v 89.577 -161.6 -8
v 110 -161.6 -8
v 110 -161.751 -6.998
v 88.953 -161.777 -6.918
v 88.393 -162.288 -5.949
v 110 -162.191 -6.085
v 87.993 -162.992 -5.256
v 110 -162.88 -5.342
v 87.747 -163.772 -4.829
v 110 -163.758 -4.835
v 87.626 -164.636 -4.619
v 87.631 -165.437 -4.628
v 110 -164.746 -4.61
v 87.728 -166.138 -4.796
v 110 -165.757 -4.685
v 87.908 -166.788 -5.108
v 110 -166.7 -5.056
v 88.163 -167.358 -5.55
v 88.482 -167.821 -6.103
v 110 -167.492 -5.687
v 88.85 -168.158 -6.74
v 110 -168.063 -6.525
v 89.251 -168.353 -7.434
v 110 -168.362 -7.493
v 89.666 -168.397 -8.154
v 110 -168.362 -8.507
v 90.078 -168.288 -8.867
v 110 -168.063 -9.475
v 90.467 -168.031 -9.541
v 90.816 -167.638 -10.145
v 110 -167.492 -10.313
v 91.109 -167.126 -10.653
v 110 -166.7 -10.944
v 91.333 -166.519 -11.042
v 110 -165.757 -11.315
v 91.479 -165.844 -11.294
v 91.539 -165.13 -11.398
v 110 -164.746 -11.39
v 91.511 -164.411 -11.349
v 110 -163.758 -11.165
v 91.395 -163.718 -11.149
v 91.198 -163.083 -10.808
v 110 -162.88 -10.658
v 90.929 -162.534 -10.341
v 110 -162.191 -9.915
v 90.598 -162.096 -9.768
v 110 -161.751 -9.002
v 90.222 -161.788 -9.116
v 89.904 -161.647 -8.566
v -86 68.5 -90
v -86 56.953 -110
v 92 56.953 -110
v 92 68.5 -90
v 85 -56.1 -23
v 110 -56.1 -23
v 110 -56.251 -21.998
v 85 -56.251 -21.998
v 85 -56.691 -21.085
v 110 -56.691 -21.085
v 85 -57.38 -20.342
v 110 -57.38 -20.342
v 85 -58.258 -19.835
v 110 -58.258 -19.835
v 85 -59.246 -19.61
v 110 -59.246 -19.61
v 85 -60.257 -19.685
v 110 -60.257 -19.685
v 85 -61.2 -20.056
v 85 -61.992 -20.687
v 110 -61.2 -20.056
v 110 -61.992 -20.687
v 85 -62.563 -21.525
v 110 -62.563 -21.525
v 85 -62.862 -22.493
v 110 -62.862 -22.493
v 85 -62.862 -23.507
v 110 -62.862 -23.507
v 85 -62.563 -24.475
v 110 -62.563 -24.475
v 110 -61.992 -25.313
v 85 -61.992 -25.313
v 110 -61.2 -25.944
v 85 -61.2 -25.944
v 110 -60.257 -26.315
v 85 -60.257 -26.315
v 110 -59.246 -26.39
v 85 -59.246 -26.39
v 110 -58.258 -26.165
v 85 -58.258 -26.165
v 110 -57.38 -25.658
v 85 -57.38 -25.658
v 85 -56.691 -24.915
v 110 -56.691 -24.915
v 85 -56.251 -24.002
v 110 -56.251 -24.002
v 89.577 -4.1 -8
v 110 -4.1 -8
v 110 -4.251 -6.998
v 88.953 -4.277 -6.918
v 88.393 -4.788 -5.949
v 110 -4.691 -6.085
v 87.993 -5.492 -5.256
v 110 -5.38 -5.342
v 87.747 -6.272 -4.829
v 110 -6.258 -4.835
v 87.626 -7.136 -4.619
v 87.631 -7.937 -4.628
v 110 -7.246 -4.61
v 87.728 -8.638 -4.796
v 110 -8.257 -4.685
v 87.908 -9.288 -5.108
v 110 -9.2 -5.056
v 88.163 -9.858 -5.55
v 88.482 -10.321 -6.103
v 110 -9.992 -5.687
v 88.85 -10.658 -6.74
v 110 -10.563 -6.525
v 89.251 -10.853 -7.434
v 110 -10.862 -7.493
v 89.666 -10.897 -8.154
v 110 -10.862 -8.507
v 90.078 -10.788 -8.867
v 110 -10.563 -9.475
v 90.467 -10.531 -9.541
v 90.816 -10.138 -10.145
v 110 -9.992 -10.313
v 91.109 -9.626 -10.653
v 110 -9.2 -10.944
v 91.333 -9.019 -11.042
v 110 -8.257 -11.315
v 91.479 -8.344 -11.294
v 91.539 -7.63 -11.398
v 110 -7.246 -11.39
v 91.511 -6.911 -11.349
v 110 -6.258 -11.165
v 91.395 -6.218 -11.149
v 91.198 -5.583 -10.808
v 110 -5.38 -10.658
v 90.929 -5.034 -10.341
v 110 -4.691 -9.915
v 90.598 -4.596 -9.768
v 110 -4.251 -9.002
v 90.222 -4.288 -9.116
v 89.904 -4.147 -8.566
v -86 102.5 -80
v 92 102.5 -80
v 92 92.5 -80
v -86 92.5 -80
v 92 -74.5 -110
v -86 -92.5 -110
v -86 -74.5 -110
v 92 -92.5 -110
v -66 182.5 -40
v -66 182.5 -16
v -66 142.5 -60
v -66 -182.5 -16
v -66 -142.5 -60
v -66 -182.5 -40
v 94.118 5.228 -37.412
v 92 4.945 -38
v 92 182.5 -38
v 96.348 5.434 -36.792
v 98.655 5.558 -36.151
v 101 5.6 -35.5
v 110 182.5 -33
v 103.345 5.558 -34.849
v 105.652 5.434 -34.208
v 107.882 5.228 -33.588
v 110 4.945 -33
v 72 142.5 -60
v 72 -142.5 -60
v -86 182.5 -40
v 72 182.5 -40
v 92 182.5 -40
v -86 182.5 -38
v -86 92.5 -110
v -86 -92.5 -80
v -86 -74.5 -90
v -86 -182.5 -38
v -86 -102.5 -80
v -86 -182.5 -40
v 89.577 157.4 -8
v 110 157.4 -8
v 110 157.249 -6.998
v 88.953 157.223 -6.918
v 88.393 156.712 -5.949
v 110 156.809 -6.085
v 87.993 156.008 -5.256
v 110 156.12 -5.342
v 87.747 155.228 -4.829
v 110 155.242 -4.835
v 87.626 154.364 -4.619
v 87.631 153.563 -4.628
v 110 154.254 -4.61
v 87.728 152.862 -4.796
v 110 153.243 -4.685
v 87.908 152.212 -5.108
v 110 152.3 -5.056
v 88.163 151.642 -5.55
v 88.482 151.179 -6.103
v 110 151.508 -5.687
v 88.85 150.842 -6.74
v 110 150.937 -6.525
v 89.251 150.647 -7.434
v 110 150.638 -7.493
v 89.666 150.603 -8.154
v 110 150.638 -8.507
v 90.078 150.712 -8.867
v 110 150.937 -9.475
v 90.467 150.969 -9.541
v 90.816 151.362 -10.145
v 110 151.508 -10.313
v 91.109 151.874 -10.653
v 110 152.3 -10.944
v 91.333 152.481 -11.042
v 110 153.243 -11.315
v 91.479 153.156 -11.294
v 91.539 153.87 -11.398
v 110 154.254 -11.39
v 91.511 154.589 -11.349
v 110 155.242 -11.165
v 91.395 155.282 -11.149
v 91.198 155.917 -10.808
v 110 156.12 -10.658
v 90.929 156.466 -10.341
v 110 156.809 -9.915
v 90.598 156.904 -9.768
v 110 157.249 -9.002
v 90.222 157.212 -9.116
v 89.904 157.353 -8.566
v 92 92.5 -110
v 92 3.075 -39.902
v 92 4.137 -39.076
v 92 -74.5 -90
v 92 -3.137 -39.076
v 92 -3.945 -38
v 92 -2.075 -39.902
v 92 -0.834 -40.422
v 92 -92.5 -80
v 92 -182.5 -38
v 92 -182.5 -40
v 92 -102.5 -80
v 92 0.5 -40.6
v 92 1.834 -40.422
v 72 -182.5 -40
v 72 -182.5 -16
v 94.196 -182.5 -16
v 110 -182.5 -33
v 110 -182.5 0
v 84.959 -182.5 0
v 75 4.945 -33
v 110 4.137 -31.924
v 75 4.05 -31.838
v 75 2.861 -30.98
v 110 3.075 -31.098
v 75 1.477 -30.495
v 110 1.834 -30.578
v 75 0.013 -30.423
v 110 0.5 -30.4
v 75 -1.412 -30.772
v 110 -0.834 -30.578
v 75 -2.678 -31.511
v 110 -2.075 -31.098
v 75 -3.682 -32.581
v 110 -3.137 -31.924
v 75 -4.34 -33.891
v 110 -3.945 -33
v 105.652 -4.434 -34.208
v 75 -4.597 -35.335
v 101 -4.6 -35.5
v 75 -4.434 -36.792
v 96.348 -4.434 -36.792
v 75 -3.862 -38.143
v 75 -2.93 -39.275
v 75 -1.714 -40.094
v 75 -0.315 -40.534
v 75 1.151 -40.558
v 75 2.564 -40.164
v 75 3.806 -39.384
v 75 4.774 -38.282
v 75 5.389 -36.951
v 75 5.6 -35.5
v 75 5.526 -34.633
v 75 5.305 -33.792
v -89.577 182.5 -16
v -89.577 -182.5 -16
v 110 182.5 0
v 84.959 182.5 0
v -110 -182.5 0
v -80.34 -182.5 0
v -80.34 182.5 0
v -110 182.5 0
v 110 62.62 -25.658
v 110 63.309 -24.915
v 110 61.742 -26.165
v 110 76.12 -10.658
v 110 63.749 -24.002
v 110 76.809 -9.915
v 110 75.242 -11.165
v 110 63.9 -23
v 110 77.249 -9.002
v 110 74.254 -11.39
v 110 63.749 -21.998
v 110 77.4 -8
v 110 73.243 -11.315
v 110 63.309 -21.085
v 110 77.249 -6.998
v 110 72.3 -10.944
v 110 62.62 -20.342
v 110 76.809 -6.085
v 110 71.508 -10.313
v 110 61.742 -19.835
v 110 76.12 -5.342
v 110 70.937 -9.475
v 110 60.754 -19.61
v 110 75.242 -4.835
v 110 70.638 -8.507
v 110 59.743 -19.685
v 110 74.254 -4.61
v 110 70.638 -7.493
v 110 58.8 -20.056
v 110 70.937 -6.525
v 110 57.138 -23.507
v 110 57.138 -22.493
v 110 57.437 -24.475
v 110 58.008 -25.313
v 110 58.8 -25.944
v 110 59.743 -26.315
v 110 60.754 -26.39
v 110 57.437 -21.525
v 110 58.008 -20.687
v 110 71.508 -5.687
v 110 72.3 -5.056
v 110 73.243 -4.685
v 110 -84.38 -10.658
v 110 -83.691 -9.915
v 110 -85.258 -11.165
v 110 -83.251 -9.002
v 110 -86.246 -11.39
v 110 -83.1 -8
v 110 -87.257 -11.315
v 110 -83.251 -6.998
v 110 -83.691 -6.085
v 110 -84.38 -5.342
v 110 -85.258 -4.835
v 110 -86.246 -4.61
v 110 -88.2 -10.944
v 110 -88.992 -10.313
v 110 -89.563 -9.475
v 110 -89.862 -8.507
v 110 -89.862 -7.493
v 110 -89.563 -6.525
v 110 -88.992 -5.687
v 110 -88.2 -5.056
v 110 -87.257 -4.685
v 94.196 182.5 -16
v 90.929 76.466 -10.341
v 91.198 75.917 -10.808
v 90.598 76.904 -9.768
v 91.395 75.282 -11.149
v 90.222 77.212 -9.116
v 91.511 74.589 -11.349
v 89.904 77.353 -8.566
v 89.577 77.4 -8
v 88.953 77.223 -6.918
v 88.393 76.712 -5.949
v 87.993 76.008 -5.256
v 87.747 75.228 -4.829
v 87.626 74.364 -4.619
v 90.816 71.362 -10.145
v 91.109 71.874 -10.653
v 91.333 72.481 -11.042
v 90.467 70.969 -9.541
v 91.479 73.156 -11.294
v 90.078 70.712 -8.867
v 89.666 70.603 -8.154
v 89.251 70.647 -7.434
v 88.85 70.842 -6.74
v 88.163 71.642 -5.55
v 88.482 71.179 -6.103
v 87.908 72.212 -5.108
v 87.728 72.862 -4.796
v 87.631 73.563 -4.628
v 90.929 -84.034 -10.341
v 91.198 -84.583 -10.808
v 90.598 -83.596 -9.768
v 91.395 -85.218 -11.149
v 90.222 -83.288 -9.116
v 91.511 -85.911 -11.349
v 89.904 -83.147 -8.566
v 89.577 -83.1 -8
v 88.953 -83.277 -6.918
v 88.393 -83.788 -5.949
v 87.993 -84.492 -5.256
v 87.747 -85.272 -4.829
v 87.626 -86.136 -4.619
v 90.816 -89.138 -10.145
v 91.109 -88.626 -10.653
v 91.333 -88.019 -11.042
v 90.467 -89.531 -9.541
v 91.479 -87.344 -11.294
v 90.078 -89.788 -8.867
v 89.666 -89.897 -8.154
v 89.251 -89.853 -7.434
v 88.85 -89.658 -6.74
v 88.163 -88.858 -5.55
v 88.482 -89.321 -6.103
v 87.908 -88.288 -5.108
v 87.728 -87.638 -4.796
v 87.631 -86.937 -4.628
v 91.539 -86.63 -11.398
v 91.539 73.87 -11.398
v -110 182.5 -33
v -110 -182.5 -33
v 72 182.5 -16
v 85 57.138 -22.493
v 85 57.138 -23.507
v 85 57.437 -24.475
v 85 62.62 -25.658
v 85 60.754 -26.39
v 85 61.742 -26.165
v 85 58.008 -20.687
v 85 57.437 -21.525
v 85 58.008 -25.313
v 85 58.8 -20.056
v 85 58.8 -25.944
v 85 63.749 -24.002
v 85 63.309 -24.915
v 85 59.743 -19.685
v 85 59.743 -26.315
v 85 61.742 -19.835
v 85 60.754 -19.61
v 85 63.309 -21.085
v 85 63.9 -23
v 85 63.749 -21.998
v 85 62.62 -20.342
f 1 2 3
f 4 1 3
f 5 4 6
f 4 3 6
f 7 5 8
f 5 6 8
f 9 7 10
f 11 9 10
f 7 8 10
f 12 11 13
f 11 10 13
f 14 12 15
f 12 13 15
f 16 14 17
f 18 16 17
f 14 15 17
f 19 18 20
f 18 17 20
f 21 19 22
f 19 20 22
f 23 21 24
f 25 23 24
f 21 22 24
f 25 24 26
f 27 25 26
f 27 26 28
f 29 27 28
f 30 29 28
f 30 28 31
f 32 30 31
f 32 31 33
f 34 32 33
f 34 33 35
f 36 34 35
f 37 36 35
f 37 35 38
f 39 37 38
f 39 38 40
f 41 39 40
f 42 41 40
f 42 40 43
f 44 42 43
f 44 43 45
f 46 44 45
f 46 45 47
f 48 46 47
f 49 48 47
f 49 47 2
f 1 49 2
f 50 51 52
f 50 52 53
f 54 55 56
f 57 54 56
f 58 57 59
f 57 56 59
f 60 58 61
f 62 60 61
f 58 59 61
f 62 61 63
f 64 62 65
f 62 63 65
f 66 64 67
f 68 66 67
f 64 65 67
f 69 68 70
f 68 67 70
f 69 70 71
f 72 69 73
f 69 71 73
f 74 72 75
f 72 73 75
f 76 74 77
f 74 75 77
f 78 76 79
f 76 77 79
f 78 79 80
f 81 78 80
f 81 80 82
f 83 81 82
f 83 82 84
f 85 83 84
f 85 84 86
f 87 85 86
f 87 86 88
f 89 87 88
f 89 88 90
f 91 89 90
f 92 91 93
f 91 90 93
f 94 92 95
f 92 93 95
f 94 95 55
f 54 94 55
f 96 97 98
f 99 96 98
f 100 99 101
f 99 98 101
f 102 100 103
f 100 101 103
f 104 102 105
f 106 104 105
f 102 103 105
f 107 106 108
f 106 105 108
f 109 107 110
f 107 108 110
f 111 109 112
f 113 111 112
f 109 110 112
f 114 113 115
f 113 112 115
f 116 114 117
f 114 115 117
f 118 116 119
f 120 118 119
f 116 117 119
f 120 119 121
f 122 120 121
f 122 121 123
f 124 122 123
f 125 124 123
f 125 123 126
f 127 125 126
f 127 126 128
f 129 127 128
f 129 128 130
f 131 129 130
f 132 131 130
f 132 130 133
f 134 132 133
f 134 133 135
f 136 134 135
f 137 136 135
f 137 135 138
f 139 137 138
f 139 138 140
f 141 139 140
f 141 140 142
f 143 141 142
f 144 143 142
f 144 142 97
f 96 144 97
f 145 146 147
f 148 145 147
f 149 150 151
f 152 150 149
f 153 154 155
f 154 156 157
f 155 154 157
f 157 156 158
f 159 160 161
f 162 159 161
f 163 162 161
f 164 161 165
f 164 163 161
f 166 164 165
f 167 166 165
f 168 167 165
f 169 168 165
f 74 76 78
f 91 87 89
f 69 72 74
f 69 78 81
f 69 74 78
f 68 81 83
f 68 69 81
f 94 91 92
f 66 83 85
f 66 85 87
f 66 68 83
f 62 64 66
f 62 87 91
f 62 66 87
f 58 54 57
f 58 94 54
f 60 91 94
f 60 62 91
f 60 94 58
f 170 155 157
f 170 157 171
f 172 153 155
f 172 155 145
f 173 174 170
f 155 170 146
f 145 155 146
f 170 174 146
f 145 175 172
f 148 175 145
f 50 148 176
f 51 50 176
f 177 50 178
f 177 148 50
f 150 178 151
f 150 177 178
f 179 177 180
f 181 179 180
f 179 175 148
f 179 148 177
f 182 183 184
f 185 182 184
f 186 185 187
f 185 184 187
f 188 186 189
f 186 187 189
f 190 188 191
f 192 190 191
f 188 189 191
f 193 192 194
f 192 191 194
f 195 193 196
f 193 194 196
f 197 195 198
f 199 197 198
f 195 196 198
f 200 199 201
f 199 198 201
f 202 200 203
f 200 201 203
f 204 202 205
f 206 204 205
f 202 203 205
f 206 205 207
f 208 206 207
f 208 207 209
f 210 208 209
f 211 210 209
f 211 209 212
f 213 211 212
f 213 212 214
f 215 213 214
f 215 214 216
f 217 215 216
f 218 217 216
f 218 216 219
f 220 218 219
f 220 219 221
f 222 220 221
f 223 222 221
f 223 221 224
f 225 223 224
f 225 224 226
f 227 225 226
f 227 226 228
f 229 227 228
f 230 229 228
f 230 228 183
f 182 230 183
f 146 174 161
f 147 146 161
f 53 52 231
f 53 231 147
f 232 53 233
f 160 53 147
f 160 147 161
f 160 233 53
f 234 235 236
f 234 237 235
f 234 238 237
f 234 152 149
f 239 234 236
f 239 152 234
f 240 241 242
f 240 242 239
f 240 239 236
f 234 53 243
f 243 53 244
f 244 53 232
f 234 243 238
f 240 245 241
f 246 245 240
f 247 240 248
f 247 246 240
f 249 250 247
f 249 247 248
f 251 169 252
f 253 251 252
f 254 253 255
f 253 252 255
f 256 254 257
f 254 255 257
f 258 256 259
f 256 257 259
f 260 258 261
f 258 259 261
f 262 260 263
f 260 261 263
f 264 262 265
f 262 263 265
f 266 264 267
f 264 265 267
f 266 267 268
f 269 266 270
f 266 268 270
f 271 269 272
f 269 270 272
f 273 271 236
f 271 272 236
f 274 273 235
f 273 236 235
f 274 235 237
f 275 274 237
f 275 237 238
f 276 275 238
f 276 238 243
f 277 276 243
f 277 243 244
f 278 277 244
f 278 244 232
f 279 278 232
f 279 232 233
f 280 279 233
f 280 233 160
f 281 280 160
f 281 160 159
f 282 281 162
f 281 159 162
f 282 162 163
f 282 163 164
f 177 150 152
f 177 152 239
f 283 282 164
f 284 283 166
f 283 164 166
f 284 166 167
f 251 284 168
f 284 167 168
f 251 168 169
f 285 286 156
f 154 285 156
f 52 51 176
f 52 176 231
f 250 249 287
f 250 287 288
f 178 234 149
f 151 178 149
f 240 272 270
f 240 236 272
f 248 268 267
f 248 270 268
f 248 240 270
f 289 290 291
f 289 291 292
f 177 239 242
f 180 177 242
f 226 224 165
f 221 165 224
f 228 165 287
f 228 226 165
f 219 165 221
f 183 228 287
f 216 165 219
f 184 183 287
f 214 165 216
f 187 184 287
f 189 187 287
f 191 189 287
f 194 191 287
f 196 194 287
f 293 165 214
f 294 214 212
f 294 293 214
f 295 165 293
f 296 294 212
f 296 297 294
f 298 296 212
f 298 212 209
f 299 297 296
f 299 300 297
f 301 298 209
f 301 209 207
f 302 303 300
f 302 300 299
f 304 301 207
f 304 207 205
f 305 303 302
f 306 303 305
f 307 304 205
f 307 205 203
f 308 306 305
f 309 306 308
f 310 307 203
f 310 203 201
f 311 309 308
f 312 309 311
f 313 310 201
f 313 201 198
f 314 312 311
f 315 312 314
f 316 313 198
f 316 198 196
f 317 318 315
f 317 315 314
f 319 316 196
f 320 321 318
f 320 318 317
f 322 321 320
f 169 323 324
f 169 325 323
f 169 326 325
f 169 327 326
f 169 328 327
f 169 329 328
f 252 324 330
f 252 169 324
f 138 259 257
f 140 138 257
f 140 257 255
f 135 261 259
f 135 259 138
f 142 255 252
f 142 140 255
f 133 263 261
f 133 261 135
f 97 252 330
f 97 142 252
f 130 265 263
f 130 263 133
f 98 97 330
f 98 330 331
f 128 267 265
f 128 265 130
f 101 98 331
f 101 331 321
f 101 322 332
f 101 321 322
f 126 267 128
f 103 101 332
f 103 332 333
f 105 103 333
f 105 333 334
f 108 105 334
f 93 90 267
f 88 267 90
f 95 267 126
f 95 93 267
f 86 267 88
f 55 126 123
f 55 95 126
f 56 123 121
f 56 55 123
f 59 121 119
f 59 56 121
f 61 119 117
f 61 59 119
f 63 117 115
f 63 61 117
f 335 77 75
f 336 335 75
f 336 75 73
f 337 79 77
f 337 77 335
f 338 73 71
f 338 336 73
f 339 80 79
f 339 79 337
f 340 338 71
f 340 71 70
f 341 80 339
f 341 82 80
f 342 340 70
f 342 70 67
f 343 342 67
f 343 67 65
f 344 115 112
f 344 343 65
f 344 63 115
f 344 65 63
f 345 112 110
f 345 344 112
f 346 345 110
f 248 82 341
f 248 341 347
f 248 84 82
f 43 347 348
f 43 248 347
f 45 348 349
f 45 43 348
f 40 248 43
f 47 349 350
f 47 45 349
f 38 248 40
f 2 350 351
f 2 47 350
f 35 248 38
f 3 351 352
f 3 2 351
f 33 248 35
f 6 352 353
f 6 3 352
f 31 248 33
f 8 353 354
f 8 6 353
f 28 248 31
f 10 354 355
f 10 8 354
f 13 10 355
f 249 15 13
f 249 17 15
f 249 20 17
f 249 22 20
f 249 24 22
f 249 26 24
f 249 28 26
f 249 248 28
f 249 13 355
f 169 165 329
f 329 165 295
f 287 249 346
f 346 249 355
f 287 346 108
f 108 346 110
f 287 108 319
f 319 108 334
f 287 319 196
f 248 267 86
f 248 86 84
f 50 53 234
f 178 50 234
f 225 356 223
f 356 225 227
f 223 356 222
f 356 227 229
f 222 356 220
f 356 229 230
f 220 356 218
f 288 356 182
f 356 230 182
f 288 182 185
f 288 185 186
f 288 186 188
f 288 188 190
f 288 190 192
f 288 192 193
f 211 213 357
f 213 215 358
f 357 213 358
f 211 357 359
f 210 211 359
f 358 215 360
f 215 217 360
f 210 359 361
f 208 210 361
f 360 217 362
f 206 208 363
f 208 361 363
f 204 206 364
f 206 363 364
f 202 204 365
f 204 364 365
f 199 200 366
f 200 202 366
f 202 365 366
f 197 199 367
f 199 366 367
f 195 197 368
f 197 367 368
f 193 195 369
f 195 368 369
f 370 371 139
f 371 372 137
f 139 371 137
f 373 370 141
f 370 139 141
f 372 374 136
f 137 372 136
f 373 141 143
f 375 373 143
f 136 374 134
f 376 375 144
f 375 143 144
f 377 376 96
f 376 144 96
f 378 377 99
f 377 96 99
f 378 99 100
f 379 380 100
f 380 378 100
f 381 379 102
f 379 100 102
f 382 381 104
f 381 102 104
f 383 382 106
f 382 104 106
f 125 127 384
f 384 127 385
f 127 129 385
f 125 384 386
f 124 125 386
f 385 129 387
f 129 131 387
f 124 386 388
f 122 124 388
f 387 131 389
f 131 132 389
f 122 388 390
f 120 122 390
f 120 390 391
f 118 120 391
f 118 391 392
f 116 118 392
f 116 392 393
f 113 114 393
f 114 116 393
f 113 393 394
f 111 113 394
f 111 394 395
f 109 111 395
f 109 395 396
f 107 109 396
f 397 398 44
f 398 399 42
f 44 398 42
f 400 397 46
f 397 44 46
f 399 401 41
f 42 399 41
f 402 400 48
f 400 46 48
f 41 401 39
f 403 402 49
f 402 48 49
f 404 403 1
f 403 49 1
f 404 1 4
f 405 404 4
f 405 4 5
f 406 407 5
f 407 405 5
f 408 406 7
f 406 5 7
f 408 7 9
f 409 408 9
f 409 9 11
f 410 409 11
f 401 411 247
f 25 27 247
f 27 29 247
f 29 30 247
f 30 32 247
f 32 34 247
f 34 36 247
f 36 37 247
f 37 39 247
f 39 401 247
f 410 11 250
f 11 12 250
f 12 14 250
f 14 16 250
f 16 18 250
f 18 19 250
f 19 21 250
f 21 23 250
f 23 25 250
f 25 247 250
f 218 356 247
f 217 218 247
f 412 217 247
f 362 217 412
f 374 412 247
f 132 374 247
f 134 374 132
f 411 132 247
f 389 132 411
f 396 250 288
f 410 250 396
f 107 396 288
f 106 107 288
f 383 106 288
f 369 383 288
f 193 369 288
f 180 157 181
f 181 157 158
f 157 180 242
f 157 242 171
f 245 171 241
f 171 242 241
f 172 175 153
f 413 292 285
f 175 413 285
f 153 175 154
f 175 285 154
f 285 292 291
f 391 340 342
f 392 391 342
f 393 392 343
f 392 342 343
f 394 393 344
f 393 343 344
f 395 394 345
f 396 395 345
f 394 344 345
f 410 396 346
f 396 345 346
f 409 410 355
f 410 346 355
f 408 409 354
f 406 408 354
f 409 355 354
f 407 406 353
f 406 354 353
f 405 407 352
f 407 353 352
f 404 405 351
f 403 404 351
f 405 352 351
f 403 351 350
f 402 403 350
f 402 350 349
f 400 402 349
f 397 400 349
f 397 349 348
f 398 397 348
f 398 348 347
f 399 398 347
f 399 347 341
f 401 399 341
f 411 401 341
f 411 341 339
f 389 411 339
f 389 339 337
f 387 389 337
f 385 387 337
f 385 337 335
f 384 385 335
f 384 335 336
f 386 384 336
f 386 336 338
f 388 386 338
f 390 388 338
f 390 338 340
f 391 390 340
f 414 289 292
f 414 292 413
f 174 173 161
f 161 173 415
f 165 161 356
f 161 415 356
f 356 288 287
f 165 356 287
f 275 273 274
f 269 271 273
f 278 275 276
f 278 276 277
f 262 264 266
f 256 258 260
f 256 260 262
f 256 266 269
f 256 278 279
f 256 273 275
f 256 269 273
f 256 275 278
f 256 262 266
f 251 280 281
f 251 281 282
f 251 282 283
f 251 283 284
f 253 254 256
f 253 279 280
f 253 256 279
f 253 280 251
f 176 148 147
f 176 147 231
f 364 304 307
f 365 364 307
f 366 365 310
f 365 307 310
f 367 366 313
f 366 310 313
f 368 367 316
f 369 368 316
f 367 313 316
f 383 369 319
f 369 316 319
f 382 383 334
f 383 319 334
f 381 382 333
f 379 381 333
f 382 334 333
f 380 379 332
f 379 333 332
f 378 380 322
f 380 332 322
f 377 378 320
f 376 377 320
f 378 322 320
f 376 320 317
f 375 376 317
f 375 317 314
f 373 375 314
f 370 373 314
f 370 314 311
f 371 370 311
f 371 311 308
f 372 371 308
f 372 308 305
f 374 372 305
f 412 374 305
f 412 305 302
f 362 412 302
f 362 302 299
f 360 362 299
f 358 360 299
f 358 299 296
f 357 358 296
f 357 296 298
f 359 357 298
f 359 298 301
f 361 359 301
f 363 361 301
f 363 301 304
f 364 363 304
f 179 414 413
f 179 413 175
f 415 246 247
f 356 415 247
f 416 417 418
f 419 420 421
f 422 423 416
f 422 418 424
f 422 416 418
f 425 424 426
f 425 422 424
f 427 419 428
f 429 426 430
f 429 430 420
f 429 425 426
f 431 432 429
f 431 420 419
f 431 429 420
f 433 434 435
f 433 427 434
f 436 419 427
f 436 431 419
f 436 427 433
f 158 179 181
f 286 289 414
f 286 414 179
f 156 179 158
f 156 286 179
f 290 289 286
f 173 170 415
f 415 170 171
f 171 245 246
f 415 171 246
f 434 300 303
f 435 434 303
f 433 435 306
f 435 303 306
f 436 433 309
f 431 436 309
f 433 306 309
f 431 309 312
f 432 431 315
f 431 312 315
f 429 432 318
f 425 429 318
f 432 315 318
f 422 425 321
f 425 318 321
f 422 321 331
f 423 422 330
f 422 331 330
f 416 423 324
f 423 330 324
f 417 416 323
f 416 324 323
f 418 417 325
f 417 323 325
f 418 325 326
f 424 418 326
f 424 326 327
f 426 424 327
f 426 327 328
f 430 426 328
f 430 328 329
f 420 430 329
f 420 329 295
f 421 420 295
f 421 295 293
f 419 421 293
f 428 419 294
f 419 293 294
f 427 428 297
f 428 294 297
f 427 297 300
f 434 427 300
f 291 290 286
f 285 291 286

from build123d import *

# Parameters (mm, degrees)
F1_DEPTH  = 182.5
F3_DEPTH  = 200
F5_DEPTH  = 200
F7_DEPTH  = 220.001
F8_W      = 138
F8_H      = 20
F8_H_2    = 24
F9_DEPTH  = 365.001
F12_DEPTH = 35
F10_R     = 3.4
F14_DEPTH = 22.3866406461
F13_R     = 3.4
F15_DEPTH = 25
F16_DEPTH = 25


with BuildPart() as f1:
    # F0 (on Front) → F1 (new body, symmetric)
    with BuildSketch(Plane.XZ):
        Polygon((110, 0), (-110, 0), (-110, -33), (-86, -38), (-86, -110), (92, -110), (92, -38), (110, -33), align=None)
    extrude(amount=F1_DEPTH, both=True)

    # F2 (on Front) → F3 (cut, symmetric)
    with BuildSketch(Plane.XZ):
        Polygon((84.9585481157, 0), (-80.3397459622, 0), (-89.5773502692, -16), (94.1961524227, -16), align=None)
    extrude(amount=F3_DEPTH, both=True, mode=Mode.SUBTRACT)

    # F4 (on Right) → F5 (cut, symmetric)
    with BuildSketch(Plane.YZ):
        Polygon((-74.5, -90), (-74.5, -110), (56.9529946162, -110), (68.5, -90), align=None)
    extrude(amount=F5_DEPTH, both=True, mode=Mode.SUBTRACT)

    # F6 (on face) → F7 (cut, through all)
    with BuildSketch(Plane.YZ.offset(110)):
        Polygon((-102.5, -80), (-182.5, -40), (-182.5, -150), (-92.5, -150), (-92.5, -80), align=None)
        Polygon((182.5, -150), (182.5, -40), (102.5, -80), (92.5, -80), (92.5, -150), align=None)
    extrude(amount=-F7_DEPTH, mode=Mode.SUBTRACT)

    # F8 (on face) → F9 (cut, through all)
    with BuildSketch(Plane.XZ.offset(182.5)):
        with Locations((3, -50)):
            Rectangle(F8_W, F8_H)
        with Locations((3, -28)):
            Rectangle(F8_W, F8_H_2)
    extrude(amount=-F9_DEPTH, mode=Mode.SUBTRACT)

    # F11 (on face) → F12 (cut)
    with BuildSketch(Plane.YZ.offset(110)):
        with BuildLine():
            Line((-3.9452221542, -33), (4.9452221542, -33))
            ThreePointArc((4.9452221542, -33), (0.5, -30.4), (-3.9452221542, -33))
        make_face()
        with BuildLine():
            ThreePointArc((-3.9452221542, -33), (-0.7921623377, -40.4335906289), (5.6, -35.5))
            ThreePointArc((5.6, -35.5), (5.4335906289, -34.2078376623), (4.9452221542, -33))
            Line((4.9452221542, -33), (-3.9452221542, -33))
        make_face()
    extrude(amount=-F12_DEPTH, mode=Mode.SUBTRACT)

    # F10 (on face) → F14 (cut, through all)
    with BuildSketch(Plane.YZ.offset(110)):
        with Locations((-165, -8)):
            Circle(F10_R)
        with Locations((-86.5, -8)):
            Circle(F10_R)
        with Locations((-7.5, -8)):
            Circle(F10_R)
        with Locations((74, -8)):
            Circle(F10_R)
        with Locations((154, -8)):
            Circle(F10_R)
    extrude(amount=-F14_DEPTH, mode=Mode.SUBTRACT)

    # F13 (on face) → F15 (cut)
    with BuildSketch(Plane.YZ.offset(110)):
        with Locations((-59.5, -23)):
            Circle(F13_R)
        with Locations((60.5, -23)):
            Circle(F13_R)
    extrude(amount=-F15_DEPTH, mode=Mode.SUBTRACT)

    # F13 (on face) → F16 (cut)
    with BuildSketch(Plane.YZ.offset(110)):
        with Locations((-59.5, -23)):
            Circle(F13_R)
        with Locations((60.5, -23)):
            Circle(F13_R)
    extrude(amount=-F16_DEPTH, mode=Mode.SUBTRACT)


solid = f1.part
